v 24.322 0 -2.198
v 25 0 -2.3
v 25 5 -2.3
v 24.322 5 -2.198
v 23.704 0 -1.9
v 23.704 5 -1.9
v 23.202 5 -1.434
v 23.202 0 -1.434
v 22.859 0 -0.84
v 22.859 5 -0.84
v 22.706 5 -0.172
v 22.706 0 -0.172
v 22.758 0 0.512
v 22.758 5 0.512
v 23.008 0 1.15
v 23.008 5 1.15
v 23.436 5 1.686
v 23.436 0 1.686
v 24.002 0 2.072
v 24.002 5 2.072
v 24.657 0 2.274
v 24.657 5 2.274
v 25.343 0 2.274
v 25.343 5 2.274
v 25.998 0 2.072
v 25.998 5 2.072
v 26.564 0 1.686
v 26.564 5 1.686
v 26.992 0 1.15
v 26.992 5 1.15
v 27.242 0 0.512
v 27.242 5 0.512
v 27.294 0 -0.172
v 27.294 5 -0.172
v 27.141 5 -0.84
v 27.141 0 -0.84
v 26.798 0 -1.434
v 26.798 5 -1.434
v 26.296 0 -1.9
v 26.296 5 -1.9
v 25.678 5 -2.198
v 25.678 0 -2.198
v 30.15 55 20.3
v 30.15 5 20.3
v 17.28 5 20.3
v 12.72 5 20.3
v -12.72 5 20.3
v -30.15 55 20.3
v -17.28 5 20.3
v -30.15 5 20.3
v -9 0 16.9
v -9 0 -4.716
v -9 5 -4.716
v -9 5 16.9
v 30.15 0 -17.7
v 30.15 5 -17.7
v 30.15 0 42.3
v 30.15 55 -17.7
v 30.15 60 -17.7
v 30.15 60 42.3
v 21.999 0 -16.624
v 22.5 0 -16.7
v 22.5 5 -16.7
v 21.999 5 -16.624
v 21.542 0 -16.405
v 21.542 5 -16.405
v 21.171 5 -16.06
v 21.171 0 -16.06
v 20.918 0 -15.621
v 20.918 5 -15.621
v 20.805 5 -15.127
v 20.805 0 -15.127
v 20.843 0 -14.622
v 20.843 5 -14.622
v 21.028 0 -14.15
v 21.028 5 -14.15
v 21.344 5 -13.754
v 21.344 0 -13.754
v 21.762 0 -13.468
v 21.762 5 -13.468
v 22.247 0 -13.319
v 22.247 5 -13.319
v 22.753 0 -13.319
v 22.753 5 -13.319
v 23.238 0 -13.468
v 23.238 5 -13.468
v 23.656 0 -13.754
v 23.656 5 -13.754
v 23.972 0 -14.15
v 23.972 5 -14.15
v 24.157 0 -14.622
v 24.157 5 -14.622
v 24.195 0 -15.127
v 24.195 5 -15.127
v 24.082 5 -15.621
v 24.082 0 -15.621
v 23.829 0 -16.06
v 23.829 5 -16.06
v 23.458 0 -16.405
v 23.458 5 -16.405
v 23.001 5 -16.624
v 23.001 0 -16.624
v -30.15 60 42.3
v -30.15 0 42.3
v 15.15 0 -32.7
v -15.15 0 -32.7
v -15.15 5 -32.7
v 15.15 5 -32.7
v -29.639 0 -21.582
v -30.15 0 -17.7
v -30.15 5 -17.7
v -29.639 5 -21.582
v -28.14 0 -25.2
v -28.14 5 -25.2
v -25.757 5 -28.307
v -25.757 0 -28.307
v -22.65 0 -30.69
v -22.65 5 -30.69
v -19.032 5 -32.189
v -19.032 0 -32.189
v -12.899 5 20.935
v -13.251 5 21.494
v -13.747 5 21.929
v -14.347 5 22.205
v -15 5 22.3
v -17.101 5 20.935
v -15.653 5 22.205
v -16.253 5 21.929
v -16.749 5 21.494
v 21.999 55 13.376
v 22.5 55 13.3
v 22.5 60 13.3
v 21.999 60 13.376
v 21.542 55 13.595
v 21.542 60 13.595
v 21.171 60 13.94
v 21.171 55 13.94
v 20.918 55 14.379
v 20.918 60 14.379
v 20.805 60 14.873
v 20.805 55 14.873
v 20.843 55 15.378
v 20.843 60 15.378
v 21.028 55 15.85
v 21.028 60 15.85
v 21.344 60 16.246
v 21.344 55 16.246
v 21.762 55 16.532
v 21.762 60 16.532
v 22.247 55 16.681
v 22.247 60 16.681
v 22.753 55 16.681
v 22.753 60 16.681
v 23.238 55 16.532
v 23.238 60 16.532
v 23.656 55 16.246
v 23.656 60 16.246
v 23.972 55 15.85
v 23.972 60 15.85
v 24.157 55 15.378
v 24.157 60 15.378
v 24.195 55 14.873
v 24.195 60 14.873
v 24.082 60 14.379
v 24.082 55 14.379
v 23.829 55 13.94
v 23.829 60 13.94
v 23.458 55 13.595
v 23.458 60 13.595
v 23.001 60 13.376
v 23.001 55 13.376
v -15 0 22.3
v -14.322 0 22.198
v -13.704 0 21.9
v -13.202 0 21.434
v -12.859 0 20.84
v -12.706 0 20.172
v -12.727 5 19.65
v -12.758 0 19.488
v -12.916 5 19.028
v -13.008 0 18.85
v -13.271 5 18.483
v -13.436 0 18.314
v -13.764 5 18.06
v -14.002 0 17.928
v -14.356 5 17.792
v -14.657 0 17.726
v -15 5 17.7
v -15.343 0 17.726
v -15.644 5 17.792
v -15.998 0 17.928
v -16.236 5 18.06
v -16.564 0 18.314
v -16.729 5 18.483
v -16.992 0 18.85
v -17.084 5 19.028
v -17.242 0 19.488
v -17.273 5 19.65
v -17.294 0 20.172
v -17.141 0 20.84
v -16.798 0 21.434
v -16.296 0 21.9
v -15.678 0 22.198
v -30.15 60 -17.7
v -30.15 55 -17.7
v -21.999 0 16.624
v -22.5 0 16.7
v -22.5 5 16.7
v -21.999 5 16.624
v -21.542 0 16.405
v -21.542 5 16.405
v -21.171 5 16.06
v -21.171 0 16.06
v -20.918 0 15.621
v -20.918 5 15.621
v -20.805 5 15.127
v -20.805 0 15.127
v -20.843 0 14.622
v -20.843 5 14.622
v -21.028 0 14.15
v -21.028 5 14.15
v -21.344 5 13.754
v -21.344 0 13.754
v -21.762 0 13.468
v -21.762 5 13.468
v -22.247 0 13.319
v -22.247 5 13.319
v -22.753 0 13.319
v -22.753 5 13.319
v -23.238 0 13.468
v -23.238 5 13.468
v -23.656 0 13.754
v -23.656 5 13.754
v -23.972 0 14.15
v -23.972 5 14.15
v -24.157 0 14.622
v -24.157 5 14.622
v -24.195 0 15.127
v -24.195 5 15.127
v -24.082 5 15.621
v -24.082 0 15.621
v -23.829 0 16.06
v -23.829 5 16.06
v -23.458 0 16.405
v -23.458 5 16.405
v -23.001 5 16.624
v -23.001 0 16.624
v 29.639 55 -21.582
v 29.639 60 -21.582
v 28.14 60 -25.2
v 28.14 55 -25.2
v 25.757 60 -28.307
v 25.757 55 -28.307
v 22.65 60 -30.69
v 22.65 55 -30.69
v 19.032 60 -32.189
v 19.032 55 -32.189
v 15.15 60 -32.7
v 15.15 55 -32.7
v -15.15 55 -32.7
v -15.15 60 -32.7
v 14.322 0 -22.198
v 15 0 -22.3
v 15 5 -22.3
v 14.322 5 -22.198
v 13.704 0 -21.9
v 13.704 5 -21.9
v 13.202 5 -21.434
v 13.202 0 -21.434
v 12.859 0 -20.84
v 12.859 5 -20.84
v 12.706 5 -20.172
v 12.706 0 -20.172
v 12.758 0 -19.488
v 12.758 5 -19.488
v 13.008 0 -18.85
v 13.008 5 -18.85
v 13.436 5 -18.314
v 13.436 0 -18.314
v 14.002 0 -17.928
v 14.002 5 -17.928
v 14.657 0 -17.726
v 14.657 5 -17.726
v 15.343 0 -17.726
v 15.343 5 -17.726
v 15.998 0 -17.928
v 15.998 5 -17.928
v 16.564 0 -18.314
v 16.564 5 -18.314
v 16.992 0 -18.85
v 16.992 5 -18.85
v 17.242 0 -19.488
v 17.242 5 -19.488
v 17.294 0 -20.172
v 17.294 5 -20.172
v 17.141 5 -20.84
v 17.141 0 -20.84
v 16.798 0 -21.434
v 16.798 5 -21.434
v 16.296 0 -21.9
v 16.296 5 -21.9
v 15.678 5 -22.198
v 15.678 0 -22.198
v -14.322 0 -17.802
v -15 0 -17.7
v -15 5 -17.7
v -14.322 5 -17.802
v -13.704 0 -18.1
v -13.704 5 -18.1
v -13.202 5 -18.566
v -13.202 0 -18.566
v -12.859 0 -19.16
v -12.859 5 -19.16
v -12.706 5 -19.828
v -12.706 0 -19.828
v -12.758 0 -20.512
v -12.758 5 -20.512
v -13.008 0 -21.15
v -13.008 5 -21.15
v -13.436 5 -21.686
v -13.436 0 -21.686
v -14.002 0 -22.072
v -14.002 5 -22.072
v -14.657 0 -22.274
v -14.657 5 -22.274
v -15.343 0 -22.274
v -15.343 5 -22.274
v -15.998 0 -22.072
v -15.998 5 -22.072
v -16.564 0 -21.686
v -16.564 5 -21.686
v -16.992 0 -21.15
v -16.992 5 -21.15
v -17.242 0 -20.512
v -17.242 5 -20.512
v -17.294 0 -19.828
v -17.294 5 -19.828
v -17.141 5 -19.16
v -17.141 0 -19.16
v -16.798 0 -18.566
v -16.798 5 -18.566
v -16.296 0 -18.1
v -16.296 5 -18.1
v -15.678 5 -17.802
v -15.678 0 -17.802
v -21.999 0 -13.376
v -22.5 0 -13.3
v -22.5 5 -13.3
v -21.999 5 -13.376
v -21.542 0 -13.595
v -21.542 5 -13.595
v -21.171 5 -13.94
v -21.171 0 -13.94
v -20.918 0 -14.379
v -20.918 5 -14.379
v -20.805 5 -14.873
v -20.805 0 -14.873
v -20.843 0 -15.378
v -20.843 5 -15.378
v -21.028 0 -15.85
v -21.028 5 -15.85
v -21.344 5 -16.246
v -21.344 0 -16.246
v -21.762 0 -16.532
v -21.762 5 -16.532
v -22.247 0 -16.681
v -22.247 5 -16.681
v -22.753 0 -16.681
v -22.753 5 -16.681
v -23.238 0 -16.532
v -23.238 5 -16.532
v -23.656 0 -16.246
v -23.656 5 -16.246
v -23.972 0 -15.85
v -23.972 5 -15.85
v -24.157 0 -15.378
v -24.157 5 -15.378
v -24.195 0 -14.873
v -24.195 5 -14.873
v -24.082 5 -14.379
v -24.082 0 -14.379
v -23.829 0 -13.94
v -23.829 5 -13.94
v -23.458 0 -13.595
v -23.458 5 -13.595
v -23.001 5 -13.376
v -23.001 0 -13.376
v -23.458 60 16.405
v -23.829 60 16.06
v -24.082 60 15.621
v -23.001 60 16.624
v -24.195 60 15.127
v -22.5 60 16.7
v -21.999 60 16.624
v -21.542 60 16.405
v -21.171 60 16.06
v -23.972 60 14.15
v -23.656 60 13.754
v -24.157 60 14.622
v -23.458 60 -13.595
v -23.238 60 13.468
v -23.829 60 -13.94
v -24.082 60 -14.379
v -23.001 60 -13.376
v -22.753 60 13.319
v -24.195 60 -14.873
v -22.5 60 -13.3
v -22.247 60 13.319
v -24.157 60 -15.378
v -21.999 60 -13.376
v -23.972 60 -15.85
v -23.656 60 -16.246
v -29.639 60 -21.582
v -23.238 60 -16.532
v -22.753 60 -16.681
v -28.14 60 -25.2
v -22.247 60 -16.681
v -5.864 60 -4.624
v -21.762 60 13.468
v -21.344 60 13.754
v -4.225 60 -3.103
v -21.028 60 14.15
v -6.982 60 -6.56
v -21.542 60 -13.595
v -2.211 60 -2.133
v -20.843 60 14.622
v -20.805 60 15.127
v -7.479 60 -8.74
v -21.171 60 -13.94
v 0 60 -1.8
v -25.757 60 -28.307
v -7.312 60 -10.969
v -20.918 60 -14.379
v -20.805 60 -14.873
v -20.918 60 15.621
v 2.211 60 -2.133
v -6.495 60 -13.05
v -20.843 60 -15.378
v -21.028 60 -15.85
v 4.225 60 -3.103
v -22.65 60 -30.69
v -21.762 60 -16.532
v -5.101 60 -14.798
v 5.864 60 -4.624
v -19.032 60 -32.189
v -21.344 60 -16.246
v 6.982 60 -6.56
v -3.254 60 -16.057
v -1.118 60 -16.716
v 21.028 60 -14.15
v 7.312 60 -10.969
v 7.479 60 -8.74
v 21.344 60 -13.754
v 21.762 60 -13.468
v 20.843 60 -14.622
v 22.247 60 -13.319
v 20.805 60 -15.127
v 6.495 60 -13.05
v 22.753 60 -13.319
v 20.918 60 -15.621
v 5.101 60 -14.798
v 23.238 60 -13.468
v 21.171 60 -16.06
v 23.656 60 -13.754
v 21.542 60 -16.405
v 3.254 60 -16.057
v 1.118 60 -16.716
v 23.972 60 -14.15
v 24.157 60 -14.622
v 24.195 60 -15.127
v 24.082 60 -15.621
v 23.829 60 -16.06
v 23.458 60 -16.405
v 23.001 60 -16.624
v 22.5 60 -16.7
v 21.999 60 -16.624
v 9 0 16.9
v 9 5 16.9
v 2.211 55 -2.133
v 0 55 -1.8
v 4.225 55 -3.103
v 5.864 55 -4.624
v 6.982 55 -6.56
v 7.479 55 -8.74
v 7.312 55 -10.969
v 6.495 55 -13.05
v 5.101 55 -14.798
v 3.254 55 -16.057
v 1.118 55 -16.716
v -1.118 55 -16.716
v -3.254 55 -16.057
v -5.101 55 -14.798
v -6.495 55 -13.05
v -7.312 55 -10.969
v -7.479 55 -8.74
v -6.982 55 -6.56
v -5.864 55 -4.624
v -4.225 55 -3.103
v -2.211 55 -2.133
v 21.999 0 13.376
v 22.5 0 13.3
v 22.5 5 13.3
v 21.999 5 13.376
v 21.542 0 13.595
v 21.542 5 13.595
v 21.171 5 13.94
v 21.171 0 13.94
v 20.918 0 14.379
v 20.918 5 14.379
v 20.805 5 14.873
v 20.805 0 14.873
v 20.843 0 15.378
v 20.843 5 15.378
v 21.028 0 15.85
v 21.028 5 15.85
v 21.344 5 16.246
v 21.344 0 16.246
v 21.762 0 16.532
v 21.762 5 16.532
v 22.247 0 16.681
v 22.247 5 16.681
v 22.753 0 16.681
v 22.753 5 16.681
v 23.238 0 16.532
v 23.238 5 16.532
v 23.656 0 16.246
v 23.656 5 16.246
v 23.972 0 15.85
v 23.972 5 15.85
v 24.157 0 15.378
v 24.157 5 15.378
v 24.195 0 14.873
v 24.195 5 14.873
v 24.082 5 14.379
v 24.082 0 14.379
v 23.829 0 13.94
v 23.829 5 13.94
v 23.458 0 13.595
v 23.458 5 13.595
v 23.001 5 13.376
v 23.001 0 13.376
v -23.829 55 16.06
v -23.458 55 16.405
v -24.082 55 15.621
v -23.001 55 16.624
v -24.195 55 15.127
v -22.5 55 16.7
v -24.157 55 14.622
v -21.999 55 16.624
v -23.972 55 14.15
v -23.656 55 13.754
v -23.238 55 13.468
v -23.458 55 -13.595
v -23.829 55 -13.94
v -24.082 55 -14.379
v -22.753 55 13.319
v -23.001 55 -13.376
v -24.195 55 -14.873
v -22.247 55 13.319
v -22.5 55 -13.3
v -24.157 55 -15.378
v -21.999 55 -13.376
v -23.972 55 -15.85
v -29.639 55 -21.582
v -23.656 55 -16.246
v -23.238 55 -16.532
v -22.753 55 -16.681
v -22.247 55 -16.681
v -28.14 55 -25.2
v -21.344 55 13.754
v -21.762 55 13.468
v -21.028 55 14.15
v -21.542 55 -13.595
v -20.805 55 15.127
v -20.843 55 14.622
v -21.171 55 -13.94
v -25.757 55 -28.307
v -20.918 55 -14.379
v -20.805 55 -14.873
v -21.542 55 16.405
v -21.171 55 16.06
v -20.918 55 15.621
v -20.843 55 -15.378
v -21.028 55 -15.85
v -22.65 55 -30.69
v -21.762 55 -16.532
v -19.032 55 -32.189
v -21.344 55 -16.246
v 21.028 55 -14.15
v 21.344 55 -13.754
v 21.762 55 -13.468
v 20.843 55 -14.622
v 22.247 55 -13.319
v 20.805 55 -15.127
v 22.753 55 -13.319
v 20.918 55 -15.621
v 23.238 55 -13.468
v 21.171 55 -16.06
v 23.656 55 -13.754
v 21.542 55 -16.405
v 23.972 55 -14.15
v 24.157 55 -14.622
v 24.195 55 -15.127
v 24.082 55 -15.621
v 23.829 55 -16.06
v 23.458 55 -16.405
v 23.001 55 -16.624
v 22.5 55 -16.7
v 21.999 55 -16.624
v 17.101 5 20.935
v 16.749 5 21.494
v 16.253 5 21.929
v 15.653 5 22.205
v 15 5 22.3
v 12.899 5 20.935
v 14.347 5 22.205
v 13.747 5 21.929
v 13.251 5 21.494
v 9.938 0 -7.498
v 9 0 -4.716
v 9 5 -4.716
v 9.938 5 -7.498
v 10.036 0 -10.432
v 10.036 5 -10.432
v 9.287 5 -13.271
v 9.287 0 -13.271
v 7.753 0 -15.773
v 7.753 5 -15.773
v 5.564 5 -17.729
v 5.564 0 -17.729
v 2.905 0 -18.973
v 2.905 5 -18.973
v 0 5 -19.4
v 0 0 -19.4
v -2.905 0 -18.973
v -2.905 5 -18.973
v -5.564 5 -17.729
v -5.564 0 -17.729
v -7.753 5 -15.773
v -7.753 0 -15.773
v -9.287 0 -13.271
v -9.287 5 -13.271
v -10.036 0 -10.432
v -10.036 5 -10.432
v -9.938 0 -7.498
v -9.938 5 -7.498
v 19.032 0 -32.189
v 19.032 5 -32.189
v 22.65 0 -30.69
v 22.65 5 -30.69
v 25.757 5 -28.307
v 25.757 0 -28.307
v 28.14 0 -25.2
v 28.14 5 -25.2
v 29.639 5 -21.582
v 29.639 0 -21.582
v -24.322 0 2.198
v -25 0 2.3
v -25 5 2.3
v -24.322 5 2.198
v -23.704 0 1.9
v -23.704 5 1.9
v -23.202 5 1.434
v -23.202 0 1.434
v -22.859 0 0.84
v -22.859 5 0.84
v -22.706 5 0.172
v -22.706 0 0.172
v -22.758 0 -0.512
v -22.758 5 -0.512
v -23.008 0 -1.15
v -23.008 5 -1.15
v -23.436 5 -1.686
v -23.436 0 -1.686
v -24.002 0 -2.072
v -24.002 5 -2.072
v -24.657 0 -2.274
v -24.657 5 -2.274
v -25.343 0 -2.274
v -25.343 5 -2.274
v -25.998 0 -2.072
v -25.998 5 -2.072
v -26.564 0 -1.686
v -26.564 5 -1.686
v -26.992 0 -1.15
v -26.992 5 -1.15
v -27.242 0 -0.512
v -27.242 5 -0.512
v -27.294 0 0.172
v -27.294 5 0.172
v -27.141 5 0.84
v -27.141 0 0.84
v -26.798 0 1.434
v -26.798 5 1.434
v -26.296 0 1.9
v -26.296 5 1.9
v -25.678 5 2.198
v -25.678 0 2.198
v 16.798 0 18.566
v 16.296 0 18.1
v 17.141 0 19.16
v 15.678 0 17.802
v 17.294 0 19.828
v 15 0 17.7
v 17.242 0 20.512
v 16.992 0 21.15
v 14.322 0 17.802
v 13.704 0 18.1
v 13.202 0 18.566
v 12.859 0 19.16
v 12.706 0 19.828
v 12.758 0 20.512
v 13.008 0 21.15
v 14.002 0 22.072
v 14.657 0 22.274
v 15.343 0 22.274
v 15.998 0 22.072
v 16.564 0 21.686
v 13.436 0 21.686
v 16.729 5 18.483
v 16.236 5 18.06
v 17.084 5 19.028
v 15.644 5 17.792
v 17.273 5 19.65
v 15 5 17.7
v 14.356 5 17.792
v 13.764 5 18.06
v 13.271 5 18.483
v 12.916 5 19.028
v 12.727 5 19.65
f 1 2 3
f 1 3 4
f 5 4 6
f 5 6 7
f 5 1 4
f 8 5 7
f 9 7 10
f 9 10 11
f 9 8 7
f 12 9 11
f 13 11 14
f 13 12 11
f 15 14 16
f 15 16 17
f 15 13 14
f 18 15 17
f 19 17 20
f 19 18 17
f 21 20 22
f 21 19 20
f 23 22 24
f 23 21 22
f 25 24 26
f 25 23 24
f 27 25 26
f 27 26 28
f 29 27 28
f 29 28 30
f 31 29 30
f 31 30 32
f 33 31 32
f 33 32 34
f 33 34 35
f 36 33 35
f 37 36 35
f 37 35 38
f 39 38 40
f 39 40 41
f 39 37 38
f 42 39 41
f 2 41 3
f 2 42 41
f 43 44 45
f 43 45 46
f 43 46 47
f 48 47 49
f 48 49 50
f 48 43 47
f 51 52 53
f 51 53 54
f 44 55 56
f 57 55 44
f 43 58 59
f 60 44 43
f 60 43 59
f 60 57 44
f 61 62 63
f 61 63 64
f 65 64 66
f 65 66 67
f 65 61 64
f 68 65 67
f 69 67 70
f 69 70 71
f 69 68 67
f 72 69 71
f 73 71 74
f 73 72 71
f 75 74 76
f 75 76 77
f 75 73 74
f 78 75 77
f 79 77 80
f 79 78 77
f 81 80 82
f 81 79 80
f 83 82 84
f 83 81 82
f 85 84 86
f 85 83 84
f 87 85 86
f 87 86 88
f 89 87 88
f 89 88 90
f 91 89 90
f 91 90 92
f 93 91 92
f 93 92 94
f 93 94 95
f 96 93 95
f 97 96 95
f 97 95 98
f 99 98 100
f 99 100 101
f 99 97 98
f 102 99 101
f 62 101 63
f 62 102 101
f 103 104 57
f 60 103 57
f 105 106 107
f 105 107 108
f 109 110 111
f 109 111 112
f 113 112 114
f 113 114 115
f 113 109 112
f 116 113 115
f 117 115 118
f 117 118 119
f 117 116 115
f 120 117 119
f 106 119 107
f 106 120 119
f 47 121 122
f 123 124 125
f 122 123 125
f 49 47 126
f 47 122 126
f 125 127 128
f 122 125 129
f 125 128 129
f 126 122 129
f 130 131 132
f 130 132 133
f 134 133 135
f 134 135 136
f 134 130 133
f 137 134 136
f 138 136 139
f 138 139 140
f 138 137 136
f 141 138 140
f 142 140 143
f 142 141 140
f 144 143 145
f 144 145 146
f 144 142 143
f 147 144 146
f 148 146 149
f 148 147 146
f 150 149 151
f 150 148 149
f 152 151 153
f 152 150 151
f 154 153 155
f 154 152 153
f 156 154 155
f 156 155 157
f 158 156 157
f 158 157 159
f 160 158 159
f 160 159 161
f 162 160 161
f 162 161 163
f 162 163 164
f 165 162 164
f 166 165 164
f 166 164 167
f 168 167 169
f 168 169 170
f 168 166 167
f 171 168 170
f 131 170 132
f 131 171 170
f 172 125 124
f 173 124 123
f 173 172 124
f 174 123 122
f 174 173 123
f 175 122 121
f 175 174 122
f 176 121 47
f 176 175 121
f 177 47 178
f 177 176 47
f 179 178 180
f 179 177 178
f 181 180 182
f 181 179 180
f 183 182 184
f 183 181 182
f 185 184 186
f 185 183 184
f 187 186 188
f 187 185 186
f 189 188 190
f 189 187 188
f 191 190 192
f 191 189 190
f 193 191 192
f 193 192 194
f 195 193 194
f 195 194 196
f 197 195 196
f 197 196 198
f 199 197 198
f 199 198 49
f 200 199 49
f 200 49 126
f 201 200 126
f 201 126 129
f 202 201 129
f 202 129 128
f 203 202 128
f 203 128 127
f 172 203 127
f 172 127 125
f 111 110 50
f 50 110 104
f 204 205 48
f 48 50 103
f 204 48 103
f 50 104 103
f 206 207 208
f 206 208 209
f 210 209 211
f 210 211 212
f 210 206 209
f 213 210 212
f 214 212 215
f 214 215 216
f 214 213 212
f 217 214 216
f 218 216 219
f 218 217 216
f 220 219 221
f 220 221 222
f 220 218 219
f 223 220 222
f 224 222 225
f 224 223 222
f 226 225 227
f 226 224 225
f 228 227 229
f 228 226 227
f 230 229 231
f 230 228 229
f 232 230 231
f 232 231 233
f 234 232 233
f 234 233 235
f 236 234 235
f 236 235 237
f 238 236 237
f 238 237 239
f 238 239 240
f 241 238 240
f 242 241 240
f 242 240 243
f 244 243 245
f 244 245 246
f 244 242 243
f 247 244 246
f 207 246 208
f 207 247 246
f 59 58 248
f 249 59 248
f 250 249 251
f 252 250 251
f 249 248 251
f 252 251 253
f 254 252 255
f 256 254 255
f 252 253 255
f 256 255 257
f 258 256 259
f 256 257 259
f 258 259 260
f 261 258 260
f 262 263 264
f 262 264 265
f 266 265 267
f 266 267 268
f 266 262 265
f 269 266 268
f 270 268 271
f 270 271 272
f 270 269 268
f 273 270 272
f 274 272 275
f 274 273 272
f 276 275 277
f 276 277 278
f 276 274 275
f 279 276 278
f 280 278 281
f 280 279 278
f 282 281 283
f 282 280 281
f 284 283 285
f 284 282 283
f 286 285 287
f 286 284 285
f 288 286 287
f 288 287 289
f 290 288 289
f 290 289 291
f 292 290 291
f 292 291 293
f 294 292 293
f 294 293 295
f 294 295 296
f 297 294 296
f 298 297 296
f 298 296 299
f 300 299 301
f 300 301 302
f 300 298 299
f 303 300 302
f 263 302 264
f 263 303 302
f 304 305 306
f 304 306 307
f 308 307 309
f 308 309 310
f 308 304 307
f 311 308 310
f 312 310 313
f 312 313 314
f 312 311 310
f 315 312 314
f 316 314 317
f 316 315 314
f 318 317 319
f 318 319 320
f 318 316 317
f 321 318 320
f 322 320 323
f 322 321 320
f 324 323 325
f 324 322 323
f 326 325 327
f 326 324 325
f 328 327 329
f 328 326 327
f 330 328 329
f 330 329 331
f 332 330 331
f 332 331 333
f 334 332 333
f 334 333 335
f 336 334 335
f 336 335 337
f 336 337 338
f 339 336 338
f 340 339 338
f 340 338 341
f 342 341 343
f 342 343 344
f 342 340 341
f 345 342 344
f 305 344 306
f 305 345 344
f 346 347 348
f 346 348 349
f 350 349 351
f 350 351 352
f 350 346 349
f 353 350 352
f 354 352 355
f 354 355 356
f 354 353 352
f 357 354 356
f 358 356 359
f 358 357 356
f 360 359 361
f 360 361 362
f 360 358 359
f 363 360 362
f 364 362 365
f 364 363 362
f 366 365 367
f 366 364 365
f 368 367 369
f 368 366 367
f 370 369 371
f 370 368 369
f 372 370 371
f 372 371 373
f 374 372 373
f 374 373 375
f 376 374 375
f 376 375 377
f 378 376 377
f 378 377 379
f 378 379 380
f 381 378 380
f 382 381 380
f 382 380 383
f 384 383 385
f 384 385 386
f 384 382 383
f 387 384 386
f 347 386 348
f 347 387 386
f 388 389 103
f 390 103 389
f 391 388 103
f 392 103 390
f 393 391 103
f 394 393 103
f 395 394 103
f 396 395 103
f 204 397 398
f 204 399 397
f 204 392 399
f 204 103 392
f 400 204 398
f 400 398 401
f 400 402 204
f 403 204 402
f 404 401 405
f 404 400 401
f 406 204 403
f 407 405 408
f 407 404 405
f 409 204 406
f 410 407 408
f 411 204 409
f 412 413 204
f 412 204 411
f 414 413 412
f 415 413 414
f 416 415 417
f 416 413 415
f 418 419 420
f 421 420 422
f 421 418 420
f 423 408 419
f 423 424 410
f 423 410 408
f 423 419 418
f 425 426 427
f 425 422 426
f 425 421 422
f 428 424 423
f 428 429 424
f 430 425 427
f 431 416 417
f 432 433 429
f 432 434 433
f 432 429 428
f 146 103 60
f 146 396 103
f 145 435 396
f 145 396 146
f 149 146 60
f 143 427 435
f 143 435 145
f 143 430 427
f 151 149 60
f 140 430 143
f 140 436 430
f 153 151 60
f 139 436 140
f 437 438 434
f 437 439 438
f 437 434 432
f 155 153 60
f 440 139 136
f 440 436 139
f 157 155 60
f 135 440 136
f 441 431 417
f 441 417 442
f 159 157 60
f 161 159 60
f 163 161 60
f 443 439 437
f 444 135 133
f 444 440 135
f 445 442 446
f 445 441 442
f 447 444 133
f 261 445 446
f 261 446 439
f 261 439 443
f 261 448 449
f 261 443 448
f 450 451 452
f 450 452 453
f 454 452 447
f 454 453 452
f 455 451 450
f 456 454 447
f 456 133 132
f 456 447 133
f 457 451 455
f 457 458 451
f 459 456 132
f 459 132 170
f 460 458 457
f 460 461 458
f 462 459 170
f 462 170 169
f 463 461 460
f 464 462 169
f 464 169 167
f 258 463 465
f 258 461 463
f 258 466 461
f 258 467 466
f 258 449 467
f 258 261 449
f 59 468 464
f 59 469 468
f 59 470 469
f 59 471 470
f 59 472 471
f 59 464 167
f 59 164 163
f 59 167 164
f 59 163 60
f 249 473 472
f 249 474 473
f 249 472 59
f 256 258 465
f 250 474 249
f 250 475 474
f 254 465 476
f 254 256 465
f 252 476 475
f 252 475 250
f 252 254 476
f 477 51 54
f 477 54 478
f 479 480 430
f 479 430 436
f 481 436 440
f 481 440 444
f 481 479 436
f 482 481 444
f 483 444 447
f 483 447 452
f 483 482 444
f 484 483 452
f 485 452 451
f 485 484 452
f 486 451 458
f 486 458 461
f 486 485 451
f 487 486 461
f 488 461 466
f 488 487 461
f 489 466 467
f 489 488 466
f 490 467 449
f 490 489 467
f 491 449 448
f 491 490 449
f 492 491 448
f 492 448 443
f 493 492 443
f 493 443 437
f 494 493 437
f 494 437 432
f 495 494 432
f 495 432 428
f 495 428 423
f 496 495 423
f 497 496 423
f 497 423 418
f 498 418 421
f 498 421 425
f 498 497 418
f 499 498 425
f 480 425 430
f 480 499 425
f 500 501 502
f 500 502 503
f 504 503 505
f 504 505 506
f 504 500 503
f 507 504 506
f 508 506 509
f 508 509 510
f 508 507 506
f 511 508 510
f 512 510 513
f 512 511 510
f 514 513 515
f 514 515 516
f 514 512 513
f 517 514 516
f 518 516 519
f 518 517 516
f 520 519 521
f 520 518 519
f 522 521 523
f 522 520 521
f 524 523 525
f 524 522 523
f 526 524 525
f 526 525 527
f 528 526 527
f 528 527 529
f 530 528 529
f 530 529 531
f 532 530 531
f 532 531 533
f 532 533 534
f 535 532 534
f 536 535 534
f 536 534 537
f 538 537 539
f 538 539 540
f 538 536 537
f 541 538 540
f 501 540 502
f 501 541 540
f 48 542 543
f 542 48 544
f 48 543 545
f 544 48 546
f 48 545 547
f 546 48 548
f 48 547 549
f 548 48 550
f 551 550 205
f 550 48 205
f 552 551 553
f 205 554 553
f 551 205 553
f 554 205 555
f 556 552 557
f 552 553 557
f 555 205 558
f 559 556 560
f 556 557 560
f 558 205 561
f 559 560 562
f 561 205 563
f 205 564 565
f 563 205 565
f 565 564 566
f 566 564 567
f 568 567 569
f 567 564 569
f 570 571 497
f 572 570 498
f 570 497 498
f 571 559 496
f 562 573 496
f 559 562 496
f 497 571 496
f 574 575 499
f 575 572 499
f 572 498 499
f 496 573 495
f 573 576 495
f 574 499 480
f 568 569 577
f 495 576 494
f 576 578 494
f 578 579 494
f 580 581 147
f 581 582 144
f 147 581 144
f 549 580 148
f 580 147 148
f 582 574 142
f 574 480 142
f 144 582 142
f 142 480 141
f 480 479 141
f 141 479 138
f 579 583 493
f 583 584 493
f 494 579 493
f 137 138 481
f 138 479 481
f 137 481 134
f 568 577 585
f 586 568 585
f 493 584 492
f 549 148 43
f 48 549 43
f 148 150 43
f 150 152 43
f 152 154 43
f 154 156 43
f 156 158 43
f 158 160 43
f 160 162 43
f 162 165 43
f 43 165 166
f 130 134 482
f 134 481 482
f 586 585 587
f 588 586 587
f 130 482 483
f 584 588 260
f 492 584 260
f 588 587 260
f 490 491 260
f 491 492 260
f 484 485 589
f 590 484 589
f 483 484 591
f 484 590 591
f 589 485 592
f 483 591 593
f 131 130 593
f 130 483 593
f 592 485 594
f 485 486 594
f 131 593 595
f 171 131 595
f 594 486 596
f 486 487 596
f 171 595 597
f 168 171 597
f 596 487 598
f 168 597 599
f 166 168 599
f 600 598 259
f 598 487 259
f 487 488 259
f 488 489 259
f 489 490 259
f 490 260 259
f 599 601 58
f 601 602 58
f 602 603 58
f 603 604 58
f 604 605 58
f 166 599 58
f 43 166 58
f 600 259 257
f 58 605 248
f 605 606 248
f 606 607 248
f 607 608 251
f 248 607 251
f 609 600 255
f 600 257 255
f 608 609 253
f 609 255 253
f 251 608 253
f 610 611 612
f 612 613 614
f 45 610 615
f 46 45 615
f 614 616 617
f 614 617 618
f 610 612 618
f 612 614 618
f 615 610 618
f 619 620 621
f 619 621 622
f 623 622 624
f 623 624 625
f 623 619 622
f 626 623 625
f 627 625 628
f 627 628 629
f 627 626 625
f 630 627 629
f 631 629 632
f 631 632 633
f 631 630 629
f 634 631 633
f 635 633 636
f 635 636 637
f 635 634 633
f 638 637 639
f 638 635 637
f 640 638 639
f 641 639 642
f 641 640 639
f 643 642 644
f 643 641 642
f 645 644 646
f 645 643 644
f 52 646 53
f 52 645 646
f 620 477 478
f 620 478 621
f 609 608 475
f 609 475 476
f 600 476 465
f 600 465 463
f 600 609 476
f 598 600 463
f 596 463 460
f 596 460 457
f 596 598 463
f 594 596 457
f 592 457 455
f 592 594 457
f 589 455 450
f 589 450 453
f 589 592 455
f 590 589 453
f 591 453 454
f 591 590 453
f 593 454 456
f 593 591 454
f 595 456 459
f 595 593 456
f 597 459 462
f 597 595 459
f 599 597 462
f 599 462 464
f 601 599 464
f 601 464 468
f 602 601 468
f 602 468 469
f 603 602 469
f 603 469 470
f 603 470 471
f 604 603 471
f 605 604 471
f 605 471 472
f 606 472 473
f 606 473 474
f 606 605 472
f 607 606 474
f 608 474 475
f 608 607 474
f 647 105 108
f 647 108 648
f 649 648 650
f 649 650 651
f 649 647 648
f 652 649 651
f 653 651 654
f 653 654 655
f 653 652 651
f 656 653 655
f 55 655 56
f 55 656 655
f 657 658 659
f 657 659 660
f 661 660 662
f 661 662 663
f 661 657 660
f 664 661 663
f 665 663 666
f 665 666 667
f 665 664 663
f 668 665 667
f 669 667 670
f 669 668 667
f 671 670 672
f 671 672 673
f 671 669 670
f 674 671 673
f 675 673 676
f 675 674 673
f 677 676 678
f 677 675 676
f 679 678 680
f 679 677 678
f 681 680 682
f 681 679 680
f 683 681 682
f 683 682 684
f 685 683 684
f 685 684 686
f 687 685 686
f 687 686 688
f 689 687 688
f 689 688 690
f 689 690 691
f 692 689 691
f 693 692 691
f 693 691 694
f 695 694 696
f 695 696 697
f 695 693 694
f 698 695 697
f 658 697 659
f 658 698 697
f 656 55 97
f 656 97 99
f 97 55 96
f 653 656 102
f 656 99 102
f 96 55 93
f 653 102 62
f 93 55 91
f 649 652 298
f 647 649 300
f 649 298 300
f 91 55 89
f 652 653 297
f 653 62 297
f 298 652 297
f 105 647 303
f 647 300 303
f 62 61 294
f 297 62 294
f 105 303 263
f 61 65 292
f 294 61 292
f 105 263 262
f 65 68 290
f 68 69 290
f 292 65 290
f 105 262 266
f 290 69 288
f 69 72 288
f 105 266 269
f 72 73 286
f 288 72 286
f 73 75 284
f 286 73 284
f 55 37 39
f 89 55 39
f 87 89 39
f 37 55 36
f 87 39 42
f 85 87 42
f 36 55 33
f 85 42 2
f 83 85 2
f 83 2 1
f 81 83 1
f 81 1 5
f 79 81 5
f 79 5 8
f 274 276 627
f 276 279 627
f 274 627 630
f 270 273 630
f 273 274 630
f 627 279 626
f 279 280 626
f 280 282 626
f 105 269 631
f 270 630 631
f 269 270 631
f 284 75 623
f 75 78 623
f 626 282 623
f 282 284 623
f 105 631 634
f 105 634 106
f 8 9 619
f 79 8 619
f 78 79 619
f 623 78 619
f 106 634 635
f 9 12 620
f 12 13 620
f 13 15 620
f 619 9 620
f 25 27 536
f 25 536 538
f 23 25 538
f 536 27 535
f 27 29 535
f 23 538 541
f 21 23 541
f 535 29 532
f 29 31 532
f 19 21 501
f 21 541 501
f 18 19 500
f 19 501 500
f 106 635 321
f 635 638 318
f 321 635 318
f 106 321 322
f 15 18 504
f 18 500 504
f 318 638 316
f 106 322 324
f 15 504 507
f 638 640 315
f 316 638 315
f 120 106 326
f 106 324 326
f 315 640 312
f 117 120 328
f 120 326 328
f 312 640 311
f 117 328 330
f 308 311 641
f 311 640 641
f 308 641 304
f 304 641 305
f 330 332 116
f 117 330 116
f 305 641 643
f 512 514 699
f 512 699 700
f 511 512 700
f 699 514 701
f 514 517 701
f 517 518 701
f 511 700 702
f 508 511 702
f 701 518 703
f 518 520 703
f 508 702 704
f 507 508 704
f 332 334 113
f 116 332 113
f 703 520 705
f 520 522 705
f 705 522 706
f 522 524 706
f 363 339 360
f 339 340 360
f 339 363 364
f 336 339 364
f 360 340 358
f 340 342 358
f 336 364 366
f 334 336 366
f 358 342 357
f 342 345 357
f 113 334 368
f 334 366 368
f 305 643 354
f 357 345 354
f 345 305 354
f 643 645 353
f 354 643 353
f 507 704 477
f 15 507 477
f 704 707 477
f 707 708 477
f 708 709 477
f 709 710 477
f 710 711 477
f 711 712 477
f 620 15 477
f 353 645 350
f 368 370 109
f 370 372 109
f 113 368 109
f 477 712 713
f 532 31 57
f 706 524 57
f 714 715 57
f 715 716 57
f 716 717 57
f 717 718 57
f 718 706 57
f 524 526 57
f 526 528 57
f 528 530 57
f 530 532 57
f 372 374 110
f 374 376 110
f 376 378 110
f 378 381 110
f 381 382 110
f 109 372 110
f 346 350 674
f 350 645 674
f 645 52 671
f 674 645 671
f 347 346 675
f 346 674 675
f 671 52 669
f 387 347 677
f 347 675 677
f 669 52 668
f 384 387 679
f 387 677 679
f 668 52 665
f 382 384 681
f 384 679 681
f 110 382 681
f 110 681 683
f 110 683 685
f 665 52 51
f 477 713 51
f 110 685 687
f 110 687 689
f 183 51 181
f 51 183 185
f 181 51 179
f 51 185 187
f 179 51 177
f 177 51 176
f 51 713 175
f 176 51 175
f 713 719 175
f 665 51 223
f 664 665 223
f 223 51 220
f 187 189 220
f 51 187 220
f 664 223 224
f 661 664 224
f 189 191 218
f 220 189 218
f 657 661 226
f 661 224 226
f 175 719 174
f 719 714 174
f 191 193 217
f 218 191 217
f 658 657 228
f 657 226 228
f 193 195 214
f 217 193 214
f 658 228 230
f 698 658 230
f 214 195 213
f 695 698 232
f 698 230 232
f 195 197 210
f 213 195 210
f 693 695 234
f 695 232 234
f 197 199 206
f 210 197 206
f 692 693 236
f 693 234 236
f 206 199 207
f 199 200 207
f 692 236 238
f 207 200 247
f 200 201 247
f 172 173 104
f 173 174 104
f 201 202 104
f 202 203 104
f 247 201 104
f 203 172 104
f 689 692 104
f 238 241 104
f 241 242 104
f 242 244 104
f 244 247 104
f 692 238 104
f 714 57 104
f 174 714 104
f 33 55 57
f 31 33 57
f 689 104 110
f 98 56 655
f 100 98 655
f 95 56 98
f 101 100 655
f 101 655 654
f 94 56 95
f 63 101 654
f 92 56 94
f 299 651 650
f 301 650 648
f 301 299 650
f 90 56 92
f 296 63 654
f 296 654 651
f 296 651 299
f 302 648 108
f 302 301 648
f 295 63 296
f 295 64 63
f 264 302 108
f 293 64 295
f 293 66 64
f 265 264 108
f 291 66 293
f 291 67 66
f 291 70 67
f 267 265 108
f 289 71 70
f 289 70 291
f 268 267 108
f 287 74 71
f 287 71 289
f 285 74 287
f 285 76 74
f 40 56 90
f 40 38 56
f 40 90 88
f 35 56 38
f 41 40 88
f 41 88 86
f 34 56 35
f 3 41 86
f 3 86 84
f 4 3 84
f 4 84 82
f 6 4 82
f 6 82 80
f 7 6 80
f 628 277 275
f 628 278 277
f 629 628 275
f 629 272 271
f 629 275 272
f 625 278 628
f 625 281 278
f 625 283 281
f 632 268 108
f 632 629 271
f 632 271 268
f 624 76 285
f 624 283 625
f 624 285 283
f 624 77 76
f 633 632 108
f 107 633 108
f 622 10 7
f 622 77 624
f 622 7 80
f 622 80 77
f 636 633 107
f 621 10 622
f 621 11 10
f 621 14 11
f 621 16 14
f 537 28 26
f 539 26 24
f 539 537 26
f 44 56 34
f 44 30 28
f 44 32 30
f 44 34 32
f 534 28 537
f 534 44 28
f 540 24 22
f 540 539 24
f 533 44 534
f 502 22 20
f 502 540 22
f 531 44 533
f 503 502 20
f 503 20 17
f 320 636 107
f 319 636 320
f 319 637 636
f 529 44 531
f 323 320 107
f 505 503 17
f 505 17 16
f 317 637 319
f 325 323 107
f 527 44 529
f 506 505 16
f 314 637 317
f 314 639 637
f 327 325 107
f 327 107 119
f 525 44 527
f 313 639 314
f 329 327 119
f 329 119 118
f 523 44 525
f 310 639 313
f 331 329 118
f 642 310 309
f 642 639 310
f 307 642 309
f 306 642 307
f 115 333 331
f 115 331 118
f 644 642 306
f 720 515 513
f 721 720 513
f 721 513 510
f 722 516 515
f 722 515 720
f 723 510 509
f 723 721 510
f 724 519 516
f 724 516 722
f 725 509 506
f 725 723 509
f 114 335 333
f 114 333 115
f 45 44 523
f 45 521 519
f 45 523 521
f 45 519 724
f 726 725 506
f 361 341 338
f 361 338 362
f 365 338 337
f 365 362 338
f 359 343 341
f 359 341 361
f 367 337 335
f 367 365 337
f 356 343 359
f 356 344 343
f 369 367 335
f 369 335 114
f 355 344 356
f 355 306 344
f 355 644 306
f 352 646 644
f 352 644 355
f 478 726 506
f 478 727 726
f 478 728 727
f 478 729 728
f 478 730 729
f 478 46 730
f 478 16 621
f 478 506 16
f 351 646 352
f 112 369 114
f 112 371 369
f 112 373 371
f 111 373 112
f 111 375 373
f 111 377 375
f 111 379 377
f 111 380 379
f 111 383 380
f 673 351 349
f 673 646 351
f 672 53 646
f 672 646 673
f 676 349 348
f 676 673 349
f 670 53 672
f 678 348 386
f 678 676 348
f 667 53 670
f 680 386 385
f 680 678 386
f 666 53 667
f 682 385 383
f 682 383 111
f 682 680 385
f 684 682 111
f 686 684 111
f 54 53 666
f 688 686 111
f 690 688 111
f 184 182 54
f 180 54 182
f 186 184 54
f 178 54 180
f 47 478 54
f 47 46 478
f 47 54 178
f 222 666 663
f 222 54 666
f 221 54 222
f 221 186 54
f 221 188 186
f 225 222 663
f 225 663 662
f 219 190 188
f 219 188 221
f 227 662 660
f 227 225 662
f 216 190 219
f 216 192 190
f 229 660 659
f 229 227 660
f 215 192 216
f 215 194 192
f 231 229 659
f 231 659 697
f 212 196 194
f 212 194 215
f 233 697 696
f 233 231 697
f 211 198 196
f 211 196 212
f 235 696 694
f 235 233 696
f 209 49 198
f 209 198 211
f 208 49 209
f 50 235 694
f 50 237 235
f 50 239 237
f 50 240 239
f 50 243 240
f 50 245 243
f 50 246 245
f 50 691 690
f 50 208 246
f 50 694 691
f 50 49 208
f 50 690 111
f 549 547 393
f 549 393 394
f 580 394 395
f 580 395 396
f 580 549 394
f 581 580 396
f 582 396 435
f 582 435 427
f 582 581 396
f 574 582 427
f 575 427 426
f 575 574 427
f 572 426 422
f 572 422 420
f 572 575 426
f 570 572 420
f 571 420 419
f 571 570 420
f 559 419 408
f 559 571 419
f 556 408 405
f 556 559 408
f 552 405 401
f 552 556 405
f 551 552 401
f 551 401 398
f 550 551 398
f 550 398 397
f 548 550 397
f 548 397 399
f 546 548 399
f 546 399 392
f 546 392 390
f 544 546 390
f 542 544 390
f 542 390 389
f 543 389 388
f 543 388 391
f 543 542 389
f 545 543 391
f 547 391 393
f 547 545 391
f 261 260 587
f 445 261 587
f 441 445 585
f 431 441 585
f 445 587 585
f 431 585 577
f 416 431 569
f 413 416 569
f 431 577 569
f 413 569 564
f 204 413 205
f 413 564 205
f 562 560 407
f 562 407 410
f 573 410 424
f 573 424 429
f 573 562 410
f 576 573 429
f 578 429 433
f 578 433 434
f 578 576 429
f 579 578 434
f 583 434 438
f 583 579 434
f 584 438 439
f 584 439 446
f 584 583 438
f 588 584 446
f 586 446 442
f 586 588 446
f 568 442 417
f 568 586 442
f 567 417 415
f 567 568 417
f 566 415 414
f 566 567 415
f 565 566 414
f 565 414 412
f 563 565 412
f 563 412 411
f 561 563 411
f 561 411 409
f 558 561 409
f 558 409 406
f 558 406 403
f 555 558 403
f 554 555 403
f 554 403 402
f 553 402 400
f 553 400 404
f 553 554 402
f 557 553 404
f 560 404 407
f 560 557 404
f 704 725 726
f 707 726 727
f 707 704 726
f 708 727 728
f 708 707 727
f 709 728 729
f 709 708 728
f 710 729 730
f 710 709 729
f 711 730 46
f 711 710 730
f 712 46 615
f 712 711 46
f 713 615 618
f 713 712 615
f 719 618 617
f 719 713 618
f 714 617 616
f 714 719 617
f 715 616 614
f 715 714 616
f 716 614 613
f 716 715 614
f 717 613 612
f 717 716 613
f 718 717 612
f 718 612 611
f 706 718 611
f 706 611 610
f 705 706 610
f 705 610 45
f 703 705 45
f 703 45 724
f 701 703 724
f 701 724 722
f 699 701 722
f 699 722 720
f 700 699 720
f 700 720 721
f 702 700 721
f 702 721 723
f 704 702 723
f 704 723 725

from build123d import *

# Parameters (mm, degrees)
SKETCH2_R           = 2.3
SKETCH2_R_2         = 1.7
BOSS_EXTRUDE1_DEPTH = 5
BOSS_EXTRUDE2_DEPTH = 5
SKETCH4_W           = 60.3
SKETCH4_H           = 15
BOSS_EXTRUDE3_DEPTH = 50
SKETCH5_R           = 1.7
SKETCH5_R_2         = 7.5
BOSS_EXTRUDE4_DEPTH = 5
SKETCH7_W           = 60.3
SKETCH7_H           = 50
BOSS_EXTRUDE6_DEPTH = 7


with BuildPart() as part:
    # Sketch2 → Boss-Extrude1 (new body)
    with BuildSketch(Plane(origin=(0, 0, 0), x_dir=(1, 0, 0), z_dir=(0, 1, 0))):
        with BuildLine():
            Line((15.15, -32.7), (-15.15, -32.7))
            ThreePointArc((-15.15, -32.7), (-25.756601718, -28.306601718), (-30.15, -17.7))
            Line((-30.15, -17.7), (-30.15, 17.7))
            ThreePointArc((-30.15, 17.7), (-25.756601718, 28.306601718), (-15.15, 32.7))
            Line((-15.15, 32.7), (15.15, 32.7))
            ThreePointArc((15.15, 32.7), (25.756601718, 28.306601718), (30.15, 17.7))
            Line((30.15, 17.7), (30.15, -17.7))
            ThreePointArc((30.15, -17.7), (25.756601718, -28.306601718), (15.15, -32.7))
        make_face()
        with Locations(Location((-15, 20, 0), (0, 0, 270))):
            Circle(SKETCH2_R, mode=Mode.SUBTRACT)
        with Locations(Location((-25, 0, 0), (0, 0, 270))):
            Circle(SKETCH2_R, mode=Mode.SUBTRACT)
        with Locations(Location((-15, -20, 0), (0, 0, 270))):
            Circle(SKETCH2_R, mode=Mode.SUBTRACT)
        with Locations(Location((-22.5, -15, 0), (0, 0, 270))):
            Circle(SKETCH2_R_2, mode=Mode.SUBTRACT)
        with Locations(Location((-22.5, 15, 0), (0, 0, 270))):
            Circle(SKETCH2_R_2, mode=Mode.SUBTRACT)
        with Locations(Location((15, 20, 0), (0, 0, 90))):
            Circle(SKETCH2_R, mode=Mode.SUBTRACT)
        with Locations(Location((22.5, 15, 0), (0, 0, 90))):
            Circle(SKETCH2_R_2, mode=Mode.SUBTRACT)
        with Locations(Location((25, 0, 0), (0, 0, 90))):
            Circle(SKETCH2_R, mode=Mode.SUBTRACT)
        with Locations(Location((22.5, -15, 0), (0, 0, 90))):
            Circle(SKETCH2_R_2, mode=Mode.SUBTRACT)
        with Locations(Location((15, -20, 0), (0, 0, 90))):
            Circle(SKETCH2_R, mode=Mode.SUBTRACT)
        with BuildLine():
            Line((-9, 4.716333345), (-9, -16.9))
            Line((-9, -16.9), (9, -16.9))
            Line((9, -16.9), (9, 4.716333345))
            ThreePointArc((9, 4.716333345), (0, 19.4), (-9, 4.716333345))
        make_face(mode=Mode.SUBTRACT)
    extrude(amount=BOSS_EXTRUDE1_DEPTH)

    # Sketch3 → Boss-Extrude2 (add)
    with BuildSketch(Plane.XZ):
        Polygon((-30.15, 17.7), (-30.15, 42.3), (30.15, 42.3), (30.15, 17.7), (15.15, 32.7), (-15.15, 32.7), align=None)
    extrude(amount=-BOSS_EXTRUDE2_DEPTH)

    # Sketch4 → Boss-Extrude3 (add)
    with BuildSketch(Plane(origin=(0, 5, 0), x_dir=(1, 0, 0), z_dir=(0, 1, 0))):
        with Locations((0, -34.8)):
            Rectangle(SKETCH4_W, SKETCH4_H)
    extrude(amount=BOSS_EXTRUDE3_DEPTH)

    # Sketch5 → Boss-Extrude4 (add)
    with BuildSketch(Plane(origin=(0, 55, 0), x_dir=(1, 0, 0), z_dir=(0, 1, 0))):
        with BuildLine():
            Line((-30.15, -42.3), (30.15, -42.3))
            Line((30.15, -42.3), (30.15, 17.7))
            ThreePointArc((30.15, 17.7), (25.756601718, 28.306601718), (15.15, 32.7))
            Line((15.15, 32.7), (-15.15, 32.7))
            ThreePointArc((-15.15, 32.7), (-25.756601718, 28.306601718), (-30.15, 17.7))
            Line((-30.15, 17.7), (-30.15, -42.3))
        make_face()
        with Locations(Location((-22.5, 15, 0), (0, 0, 270))):
            Circle(SKETCH5_R, mode=Mode.SUBTRACT)
        with Locations(Location((-22.5, -15, 0), (0, 0, 270))):
            Circle(SKETCH5_R, mode=Mode.SUBTRACT)
        with Locations(Location((22.5, 15, 0), (0, 0, 90))):
            Circle(SKETCH5_R, mode=Mode.SUBTRACT)
        with Locations(Location((22.5, -15, 0), (0, 0, 90))):
            Circle(SKETCH5_R, mode=Mode.SUBTRACT)
        with Locations(Location((0, 9.3, 0), (0, 0, 270))):
            Circle(SKETCH5_R_2, mode=Mode.SUBTRACT)
    extrude(amount=BOSS_EXTRUDE4_DEPTH)

    # Sketch7 → Boss-Extrude6 (add)
    with BuildSketch(Plane(origin=(0, 0, 27.3), x_dir=(-1, 0, 0), z_dir=(0, 0, -1))):
        with Locations((0, 30)):
            Rectangle(SKETCH7_W, SKETCH7_H)
    extrude(amount=BOSS_EXTRUDE6_DEPTH)


solid = part.part
